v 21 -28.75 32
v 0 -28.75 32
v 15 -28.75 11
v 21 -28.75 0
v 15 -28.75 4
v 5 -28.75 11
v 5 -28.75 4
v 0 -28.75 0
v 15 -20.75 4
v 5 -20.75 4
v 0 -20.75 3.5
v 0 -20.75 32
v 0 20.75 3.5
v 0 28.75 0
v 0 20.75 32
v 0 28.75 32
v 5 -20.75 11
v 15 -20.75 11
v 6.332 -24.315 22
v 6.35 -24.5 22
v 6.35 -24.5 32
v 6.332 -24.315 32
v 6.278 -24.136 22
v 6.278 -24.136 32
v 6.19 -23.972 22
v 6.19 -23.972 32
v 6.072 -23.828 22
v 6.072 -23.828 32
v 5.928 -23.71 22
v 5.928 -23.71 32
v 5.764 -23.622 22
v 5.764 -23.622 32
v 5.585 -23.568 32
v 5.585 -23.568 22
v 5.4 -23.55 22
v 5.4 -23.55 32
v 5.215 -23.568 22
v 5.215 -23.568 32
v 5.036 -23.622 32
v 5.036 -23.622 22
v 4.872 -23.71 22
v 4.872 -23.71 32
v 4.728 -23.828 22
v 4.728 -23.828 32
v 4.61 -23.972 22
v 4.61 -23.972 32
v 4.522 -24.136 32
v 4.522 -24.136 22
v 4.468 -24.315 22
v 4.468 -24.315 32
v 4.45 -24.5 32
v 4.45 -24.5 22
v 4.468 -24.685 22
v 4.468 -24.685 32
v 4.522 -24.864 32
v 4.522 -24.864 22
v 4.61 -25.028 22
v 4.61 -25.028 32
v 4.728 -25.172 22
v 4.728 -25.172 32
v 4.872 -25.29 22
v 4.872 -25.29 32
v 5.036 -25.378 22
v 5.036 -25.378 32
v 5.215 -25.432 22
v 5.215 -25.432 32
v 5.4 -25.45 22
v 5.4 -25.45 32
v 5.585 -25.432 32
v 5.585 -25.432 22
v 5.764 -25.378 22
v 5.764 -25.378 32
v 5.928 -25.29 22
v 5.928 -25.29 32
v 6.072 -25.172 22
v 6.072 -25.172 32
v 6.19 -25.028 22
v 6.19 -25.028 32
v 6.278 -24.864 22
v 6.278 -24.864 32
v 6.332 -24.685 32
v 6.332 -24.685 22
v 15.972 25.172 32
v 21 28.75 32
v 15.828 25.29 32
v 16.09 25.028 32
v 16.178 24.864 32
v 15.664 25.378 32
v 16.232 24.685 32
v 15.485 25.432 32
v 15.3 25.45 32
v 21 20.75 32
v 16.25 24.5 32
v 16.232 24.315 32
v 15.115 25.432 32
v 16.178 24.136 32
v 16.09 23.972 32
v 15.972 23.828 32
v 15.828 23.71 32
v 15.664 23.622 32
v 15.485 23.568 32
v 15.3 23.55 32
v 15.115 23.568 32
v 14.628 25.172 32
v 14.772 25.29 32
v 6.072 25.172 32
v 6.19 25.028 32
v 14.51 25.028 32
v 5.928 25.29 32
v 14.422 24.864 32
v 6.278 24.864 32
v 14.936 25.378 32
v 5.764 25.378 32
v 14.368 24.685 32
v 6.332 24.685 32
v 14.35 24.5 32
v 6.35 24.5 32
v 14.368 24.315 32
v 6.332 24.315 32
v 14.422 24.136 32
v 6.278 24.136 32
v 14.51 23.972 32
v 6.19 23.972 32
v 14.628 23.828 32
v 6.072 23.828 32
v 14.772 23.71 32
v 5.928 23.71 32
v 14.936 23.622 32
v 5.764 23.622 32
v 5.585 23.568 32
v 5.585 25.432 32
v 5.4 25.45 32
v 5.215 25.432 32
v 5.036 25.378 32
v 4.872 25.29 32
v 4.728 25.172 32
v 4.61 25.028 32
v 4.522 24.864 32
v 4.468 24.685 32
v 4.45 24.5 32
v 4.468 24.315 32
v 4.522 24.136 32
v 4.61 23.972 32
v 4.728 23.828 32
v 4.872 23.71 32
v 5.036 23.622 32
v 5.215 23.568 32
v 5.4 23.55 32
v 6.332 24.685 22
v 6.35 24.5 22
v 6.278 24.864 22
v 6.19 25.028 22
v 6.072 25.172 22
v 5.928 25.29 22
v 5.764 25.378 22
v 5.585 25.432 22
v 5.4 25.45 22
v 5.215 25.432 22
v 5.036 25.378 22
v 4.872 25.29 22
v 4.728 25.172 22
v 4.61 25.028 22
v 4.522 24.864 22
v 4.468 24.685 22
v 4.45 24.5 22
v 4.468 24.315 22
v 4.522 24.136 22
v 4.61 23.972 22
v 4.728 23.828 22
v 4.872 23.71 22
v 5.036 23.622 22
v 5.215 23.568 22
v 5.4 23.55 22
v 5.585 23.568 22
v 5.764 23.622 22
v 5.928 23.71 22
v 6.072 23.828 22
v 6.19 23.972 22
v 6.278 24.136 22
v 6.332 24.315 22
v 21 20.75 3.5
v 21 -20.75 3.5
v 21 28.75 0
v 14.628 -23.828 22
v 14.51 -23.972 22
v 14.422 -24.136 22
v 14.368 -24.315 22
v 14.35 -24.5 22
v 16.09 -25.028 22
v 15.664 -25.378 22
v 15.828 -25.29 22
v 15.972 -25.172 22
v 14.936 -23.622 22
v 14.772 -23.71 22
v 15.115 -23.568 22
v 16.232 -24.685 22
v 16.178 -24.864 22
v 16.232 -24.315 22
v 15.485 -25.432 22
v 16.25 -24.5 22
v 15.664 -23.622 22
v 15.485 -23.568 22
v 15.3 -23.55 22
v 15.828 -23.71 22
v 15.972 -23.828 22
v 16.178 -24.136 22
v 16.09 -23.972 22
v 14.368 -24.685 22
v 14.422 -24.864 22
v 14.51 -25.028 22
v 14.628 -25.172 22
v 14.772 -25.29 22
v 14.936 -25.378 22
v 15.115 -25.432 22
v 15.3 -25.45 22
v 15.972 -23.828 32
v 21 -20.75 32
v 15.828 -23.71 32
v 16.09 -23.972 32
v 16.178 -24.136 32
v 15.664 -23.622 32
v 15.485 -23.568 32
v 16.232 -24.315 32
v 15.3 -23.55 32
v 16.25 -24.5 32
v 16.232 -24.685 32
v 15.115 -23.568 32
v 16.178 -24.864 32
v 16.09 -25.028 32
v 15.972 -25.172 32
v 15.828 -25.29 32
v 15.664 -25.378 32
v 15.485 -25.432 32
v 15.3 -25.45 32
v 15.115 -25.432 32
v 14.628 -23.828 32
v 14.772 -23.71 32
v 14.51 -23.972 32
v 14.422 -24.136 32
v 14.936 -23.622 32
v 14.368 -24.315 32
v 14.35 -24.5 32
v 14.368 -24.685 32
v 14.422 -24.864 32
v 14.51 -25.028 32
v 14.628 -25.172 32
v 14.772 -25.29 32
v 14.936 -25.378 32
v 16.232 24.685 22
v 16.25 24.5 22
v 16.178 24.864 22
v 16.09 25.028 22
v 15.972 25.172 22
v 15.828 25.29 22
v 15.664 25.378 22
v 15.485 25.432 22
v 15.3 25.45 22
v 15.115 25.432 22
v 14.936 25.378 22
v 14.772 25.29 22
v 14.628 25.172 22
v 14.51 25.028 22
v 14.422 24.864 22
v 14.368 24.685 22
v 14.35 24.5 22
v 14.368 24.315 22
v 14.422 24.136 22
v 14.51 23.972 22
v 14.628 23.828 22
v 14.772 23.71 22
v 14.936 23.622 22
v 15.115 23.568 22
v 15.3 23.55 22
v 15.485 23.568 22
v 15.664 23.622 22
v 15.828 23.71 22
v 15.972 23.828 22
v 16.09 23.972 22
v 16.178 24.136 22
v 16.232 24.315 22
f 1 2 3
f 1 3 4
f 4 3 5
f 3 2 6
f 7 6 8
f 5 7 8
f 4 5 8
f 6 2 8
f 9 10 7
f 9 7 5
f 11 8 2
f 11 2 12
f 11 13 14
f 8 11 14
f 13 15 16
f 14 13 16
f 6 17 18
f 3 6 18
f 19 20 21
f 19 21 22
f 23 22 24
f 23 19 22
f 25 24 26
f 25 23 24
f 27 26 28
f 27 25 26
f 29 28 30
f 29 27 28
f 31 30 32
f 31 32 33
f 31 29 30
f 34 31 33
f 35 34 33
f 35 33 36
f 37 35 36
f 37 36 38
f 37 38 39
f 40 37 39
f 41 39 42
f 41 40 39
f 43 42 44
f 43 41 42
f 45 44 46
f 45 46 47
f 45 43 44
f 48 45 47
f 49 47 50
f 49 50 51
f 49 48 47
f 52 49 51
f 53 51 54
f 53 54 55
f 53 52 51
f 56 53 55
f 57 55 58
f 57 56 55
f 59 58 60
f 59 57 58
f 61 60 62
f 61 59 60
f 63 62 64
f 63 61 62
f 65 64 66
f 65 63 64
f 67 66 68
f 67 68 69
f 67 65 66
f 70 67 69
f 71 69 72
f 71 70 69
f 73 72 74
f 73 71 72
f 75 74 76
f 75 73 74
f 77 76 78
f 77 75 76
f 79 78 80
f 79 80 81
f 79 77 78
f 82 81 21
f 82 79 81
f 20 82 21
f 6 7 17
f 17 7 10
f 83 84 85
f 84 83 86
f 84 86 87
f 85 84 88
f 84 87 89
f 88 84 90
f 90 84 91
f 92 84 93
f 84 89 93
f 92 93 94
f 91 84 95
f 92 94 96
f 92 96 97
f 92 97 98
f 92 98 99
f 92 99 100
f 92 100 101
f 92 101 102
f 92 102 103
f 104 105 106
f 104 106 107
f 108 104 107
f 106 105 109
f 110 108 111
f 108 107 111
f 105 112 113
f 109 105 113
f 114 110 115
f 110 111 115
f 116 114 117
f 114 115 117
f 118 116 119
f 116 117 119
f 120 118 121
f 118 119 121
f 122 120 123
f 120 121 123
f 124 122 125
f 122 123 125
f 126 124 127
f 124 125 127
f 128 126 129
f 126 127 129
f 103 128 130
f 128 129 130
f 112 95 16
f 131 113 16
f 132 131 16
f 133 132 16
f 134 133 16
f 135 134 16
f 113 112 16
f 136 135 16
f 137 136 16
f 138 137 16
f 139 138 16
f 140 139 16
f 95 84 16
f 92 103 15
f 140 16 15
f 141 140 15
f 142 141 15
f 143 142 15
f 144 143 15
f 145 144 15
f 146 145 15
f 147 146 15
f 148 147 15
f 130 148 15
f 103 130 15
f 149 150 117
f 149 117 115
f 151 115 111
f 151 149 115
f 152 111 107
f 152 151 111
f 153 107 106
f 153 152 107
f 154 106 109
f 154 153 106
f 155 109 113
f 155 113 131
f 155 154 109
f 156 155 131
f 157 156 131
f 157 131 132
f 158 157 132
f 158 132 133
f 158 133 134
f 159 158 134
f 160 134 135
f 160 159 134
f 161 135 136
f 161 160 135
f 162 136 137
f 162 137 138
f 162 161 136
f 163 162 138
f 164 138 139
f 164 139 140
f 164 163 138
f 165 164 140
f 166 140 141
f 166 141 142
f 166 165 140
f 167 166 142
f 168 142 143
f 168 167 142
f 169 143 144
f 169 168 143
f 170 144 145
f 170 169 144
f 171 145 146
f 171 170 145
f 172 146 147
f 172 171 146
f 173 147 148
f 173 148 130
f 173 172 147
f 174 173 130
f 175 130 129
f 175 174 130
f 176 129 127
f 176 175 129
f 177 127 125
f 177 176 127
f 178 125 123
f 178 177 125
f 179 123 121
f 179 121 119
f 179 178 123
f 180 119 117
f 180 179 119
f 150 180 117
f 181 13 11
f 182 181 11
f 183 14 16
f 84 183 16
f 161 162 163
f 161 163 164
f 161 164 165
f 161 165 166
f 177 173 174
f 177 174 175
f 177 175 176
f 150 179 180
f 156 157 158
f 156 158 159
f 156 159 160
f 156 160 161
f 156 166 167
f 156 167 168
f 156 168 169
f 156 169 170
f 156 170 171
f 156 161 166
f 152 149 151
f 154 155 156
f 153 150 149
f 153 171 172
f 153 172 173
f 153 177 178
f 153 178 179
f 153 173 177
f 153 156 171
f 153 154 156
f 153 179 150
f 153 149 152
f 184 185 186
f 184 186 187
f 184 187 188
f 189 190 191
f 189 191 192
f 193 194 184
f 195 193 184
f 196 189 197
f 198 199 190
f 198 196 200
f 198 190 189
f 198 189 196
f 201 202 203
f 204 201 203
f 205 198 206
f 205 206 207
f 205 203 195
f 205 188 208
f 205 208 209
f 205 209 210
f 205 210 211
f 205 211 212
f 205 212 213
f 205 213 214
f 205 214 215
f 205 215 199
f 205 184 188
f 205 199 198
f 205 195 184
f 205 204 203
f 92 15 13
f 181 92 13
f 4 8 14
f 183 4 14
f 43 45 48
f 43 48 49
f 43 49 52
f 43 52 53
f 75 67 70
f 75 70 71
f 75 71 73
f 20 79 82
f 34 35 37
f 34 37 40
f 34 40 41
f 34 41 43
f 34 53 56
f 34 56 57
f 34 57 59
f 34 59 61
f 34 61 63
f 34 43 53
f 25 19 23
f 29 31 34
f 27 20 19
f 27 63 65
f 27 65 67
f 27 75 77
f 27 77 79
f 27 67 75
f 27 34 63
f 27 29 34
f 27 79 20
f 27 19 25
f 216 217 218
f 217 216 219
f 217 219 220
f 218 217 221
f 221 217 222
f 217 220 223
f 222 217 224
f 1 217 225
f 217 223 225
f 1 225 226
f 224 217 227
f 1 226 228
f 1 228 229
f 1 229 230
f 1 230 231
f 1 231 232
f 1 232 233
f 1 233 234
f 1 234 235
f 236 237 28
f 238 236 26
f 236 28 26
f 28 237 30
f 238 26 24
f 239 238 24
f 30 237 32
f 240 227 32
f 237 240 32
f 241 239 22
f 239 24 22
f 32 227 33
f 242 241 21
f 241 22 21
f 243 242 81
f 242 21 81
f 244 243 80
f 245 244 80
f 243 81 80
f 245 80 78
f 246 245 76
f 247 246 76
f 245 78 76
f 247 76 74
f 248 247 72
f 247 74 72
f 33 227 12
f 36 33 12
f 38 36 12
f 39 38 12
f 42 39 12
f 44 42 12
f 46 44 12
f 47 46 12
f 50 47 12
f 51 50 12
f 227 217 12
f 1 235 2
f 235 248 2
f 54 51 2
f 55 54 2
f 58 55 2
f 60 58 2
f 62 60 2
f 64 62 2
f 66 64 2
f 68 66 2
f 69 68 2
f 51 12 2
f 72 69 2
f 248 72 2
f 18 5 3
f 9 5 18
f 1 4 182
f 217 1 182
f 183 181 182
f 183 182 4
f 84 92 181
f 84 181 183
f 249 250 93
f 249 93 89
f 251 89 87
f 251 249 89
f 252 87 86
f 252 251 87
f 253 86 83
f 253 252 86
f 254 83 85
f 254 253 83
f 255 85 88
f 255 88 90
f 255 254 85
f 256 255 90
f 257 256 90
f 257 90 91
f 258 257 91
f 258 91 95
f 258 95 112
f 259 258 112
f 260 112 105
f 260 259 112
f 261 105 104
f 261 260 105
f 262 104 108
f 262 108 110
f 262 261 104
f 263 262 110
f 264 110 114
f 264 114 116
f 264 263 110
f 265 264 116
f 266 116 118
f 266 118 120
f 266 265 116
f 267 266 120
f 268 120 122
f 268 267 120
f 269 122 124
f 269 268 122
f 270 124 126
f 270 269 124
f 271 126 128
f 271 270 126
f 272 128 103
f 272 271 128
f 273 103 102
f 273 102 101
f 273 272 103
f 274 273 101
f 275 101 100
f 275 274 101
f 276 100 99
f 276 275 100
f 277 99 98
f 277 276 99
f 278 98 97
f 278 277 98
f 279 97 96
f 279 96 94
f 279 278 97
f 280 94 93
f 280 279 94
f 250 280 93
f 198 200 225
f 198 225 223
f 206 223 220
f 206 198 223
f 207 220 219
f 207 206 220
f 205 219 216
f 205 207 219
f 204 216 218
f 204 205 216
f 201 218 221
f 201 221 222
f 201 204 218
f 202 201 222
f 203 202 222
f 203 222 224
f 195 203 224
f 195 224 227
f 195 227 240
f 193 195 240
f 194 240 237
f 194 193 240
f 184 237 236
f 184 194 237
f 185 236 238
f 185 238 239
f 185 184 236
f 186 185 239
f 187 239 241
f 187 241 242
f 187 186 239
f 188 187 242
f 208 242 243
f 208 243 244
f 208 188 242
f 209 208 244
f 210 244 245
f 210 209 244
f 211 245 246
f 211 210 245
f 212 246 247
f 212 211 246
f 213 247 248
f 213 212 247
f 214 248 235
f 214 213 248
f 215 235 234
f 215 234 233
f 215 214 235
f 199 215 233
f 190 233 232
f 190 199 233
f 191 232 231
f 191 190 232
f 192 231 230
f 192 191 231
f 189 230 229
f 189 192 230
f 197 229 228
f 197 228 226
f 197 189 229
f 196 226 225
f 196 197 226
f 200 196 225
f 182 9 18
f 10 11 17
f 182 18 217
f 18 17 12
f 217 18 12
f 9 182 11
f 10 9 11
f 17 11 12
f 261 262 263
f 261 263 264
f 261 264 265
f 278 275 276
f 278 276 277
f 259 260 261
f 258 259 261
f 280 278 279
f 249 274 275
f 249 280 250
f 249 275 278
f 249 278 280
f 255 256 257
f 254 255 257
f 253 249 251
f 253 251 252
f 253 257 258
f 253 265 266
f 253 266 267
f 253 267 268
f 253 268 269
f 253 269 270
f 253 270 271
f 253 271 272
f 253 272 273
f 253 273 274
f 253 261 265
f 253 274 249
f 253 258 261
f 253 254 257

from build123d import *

# Parameters (mm, degrees)
CYLINDER002_R     = 0.95
CYLINDER002_DEPTH = 10
CYLINDER003_R     = 0.95
CYLINDER003_DEPTH = 10
CYLINDER_R        = 0.95
CYLINDER_DEPTH    = 10
CYLINDER001_R     = 0.95
CYLINDER001_DEPTH = 10
BOX_W             = 10
BOX_H             = 10
BOX_DEPTH         = 7
PAD_DEPTH         = 21


with BuildPart() as cylinder002:
    # Cylinder002 → Cylinder002 (new body)
    with BuildSketch(Plane(origin=(9.9, 0, 0), x_dir=(1, 0, 0), z_dir=(0, 0, 1))):
        Circle(CYLINDER002_R)
    extrude(amount=CYLINDER002_DEPTH)


with BuildPart() as tornillos001:
    # Cylinder003 → Cylinder003 (new body)
    with BuildSketch(Plane.XY):
        Circle(CYLINDER003_R)
    extrude(amount=CYLINDER003_DEPTH)

    # Fusion001: union Cylinder002
    add(cylinder002.part)


with BuildPart() as tornillos001_1:
    # Fusion001 placement: moved
    add(tornillos001.part.moved(Location((5, -24.5, 22))))


with BuildPart() as cylinder:
    # Cylinder → Cylinder (new body)
    with BuildSketch(Plane(origin=(9.9, 0, 0), x_dir=(1, 0, 0), z_dir=(0, 0, 1))):
        Circle(CYLINDER_R)
    extrude(amount=CYLINDER_DEPTH)


with BuildPart() as fusion002:
    # Cylinder001 → Cylinder001 (new body)
    with BuildSketch(Plane.XY):
        Circle(CYLINDER001_R)
    extrude(amount=CYLINDER001_DEPTH)

    # Fusion: union Cylinder
    add(cylinder.part)


with BuildPart() as fusion002_1:
    # Fusion placement: moved
    add(fusion002.part.moved(Location((5, 24.5, 22))))

    # Fusion002: union Tornillos001
    add(tornillos001_1.part)


with BuildPart() as fusion002_2:
    # Fusion002 placement: moved
    add(fusion002_1.part.moved(Location((0.4, 0, 0))))


with BuildPart() as cube:
    # Box → Box (new body)
    with BuildSketch(Plane(origin=(5, -29, 4), x_dir=(1, 0, 0), z_dir=(0, 0, 1))):
        with Locations((5, 5)):
            Rectangle(BOX_W, BOX_H)
    extrude(amount=BOX_DEPTH)


with BuildPart() as holder001:
    # Sketch → Pad (new body)
    with BuildSketch(Plane.YZ):
        Polygon((-28.75, 32), (-28.75, 0), (28.75, 0), (28.75, 32), (20.75, 32), (20.75, 3.5), (-20.75, 3.5), (-20.75, 32), align=None)
    extrude(amount=PAD_DEPTH)

    # Cut: cut Cube
    add(cube.part, mode=Mode.SUBTRACT)

    # Cut001: cut Fusion002
    add(fusion002_2.part, mode=Mode.SUBTRACT)


solid = holder001.part
